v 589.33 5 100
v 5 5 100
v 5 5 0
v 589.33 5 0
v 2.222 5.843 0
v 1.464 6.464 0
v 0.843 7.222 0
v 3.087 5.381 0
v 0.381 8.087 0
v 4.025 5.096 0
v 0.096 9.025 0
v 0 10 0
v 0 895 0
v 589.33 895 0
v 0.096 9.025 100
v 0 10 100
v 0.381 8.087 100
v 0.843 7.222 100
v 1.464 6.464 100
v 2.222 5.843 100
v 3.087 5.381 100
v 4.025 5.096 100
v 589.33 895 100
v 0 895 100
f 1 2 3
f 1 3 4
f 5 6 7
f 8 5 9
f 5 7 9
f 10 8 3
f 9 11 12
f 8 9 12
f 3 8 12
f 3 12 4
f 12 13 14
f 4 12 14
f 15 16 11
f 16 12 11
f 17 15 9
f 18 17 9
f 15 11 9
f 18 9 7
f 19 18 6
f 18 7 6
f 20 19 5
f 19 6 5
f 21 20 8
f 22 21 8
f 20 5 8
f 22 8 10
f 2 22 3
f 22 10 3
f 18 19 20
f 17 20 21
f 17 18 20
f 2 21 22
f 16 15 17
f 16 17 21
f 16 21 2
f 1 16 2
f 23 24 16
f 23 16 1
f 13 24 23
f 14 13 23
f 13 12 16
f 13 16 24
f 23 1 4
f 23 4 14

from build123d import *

# Parameters (mm, degrees)
SKETCH1_W           = 700
SKETCH1_H           = 900
BOSS_EXTRUDE1_DEPTH = 100
SKETCH2_W           = 102.863504397
SKETCH2_H           = 900
CUT_EXTRUDE1_DEPTH  = 1145.552314226
SKETCH3_W           = 597.136495603
SKETCH3_H           = 5
CUT_EXTRUDE2_DEPTH  = 1085.69903401
FILLET1_R           = 5
SKETCH4_W           = 597.136495603
SKETCH4_H           = 5
CUT_EXTRUDE3_DEPTH  = 1085.69903401
SKETCH5_W           = 7.806368853
SKETCH5_H           = 890
CUT_EXTRUDE4_DEPTH  = 1081.554021964


with BuildPart() as part:
    # Sketch1 → Boss-Extrude1 (new body)
    with BuildSketch(Plane.XY):
        with Locations((350, 450)):
            Rectangle(SKETCH1_W, SKETCH1_H)
    extrude(amount=BOSS_EXTRUDE1_DEPTH)

    # Sketch2 → Cut-Extrude1 (cut, through all)
    with BuildSketch(Plane.XY.offset(100)):
        with Locations((648.568247802, 450)):
            Rectangle(SKETCH2_W, SKETCH2_H)
    extrude(amount=-CUT_EXTRUDE1_DEPTH, mode=Mode.SUBTRACT)

    # Sketch3 → Cut-Extrude2 (cut, through all)
    with BuildSketch(Plane.XY.offset(100)):
        with Locations((298.568247802, 2.5)):
            Rectangle(SKETCH3_W, SKETCH3_H)
    extrude(amount=-CUT_EXTRUDE2_DEPTH, mode=Mode.SUBTRACT)

    # Fillet1
    fillet1_edges = [part.edges().sort_by_distance(p)[0] for p in [
        (597.136495603, 900, 50),
        (0, 5, 50),
        (597.136495603, 5, 50),
        (0, 900, 50),
    ]]
    fillet(fillet1_edges, radius=FILLET1_R)

    # Sketch4 → Cut-Extrude3 (cut, through all)
    with BuildSketch(Plane.XY.offset(100)):
        with Locations((298.568247802, 897.5)):
            Rectangle(SKETCH4_W, SKETCH4_H)
    extrude(amount=-CUT_EXTRUDE3_DEPTH, mode=Mode.SUBTRACT)

    # Sketch5 → Cut-Extrude4 (cut, through all)
    with BuildSketch(Plane.XY.offset(100)):
        with Locations((593.233311177, 450)):
            Rectangle(SKETCH5_W, SKETCH5_H)
    extrude(amount=-CUT_EXTRUDE4_DEPTH, mode=Mode.SUBTRACT)


solid = part.part
